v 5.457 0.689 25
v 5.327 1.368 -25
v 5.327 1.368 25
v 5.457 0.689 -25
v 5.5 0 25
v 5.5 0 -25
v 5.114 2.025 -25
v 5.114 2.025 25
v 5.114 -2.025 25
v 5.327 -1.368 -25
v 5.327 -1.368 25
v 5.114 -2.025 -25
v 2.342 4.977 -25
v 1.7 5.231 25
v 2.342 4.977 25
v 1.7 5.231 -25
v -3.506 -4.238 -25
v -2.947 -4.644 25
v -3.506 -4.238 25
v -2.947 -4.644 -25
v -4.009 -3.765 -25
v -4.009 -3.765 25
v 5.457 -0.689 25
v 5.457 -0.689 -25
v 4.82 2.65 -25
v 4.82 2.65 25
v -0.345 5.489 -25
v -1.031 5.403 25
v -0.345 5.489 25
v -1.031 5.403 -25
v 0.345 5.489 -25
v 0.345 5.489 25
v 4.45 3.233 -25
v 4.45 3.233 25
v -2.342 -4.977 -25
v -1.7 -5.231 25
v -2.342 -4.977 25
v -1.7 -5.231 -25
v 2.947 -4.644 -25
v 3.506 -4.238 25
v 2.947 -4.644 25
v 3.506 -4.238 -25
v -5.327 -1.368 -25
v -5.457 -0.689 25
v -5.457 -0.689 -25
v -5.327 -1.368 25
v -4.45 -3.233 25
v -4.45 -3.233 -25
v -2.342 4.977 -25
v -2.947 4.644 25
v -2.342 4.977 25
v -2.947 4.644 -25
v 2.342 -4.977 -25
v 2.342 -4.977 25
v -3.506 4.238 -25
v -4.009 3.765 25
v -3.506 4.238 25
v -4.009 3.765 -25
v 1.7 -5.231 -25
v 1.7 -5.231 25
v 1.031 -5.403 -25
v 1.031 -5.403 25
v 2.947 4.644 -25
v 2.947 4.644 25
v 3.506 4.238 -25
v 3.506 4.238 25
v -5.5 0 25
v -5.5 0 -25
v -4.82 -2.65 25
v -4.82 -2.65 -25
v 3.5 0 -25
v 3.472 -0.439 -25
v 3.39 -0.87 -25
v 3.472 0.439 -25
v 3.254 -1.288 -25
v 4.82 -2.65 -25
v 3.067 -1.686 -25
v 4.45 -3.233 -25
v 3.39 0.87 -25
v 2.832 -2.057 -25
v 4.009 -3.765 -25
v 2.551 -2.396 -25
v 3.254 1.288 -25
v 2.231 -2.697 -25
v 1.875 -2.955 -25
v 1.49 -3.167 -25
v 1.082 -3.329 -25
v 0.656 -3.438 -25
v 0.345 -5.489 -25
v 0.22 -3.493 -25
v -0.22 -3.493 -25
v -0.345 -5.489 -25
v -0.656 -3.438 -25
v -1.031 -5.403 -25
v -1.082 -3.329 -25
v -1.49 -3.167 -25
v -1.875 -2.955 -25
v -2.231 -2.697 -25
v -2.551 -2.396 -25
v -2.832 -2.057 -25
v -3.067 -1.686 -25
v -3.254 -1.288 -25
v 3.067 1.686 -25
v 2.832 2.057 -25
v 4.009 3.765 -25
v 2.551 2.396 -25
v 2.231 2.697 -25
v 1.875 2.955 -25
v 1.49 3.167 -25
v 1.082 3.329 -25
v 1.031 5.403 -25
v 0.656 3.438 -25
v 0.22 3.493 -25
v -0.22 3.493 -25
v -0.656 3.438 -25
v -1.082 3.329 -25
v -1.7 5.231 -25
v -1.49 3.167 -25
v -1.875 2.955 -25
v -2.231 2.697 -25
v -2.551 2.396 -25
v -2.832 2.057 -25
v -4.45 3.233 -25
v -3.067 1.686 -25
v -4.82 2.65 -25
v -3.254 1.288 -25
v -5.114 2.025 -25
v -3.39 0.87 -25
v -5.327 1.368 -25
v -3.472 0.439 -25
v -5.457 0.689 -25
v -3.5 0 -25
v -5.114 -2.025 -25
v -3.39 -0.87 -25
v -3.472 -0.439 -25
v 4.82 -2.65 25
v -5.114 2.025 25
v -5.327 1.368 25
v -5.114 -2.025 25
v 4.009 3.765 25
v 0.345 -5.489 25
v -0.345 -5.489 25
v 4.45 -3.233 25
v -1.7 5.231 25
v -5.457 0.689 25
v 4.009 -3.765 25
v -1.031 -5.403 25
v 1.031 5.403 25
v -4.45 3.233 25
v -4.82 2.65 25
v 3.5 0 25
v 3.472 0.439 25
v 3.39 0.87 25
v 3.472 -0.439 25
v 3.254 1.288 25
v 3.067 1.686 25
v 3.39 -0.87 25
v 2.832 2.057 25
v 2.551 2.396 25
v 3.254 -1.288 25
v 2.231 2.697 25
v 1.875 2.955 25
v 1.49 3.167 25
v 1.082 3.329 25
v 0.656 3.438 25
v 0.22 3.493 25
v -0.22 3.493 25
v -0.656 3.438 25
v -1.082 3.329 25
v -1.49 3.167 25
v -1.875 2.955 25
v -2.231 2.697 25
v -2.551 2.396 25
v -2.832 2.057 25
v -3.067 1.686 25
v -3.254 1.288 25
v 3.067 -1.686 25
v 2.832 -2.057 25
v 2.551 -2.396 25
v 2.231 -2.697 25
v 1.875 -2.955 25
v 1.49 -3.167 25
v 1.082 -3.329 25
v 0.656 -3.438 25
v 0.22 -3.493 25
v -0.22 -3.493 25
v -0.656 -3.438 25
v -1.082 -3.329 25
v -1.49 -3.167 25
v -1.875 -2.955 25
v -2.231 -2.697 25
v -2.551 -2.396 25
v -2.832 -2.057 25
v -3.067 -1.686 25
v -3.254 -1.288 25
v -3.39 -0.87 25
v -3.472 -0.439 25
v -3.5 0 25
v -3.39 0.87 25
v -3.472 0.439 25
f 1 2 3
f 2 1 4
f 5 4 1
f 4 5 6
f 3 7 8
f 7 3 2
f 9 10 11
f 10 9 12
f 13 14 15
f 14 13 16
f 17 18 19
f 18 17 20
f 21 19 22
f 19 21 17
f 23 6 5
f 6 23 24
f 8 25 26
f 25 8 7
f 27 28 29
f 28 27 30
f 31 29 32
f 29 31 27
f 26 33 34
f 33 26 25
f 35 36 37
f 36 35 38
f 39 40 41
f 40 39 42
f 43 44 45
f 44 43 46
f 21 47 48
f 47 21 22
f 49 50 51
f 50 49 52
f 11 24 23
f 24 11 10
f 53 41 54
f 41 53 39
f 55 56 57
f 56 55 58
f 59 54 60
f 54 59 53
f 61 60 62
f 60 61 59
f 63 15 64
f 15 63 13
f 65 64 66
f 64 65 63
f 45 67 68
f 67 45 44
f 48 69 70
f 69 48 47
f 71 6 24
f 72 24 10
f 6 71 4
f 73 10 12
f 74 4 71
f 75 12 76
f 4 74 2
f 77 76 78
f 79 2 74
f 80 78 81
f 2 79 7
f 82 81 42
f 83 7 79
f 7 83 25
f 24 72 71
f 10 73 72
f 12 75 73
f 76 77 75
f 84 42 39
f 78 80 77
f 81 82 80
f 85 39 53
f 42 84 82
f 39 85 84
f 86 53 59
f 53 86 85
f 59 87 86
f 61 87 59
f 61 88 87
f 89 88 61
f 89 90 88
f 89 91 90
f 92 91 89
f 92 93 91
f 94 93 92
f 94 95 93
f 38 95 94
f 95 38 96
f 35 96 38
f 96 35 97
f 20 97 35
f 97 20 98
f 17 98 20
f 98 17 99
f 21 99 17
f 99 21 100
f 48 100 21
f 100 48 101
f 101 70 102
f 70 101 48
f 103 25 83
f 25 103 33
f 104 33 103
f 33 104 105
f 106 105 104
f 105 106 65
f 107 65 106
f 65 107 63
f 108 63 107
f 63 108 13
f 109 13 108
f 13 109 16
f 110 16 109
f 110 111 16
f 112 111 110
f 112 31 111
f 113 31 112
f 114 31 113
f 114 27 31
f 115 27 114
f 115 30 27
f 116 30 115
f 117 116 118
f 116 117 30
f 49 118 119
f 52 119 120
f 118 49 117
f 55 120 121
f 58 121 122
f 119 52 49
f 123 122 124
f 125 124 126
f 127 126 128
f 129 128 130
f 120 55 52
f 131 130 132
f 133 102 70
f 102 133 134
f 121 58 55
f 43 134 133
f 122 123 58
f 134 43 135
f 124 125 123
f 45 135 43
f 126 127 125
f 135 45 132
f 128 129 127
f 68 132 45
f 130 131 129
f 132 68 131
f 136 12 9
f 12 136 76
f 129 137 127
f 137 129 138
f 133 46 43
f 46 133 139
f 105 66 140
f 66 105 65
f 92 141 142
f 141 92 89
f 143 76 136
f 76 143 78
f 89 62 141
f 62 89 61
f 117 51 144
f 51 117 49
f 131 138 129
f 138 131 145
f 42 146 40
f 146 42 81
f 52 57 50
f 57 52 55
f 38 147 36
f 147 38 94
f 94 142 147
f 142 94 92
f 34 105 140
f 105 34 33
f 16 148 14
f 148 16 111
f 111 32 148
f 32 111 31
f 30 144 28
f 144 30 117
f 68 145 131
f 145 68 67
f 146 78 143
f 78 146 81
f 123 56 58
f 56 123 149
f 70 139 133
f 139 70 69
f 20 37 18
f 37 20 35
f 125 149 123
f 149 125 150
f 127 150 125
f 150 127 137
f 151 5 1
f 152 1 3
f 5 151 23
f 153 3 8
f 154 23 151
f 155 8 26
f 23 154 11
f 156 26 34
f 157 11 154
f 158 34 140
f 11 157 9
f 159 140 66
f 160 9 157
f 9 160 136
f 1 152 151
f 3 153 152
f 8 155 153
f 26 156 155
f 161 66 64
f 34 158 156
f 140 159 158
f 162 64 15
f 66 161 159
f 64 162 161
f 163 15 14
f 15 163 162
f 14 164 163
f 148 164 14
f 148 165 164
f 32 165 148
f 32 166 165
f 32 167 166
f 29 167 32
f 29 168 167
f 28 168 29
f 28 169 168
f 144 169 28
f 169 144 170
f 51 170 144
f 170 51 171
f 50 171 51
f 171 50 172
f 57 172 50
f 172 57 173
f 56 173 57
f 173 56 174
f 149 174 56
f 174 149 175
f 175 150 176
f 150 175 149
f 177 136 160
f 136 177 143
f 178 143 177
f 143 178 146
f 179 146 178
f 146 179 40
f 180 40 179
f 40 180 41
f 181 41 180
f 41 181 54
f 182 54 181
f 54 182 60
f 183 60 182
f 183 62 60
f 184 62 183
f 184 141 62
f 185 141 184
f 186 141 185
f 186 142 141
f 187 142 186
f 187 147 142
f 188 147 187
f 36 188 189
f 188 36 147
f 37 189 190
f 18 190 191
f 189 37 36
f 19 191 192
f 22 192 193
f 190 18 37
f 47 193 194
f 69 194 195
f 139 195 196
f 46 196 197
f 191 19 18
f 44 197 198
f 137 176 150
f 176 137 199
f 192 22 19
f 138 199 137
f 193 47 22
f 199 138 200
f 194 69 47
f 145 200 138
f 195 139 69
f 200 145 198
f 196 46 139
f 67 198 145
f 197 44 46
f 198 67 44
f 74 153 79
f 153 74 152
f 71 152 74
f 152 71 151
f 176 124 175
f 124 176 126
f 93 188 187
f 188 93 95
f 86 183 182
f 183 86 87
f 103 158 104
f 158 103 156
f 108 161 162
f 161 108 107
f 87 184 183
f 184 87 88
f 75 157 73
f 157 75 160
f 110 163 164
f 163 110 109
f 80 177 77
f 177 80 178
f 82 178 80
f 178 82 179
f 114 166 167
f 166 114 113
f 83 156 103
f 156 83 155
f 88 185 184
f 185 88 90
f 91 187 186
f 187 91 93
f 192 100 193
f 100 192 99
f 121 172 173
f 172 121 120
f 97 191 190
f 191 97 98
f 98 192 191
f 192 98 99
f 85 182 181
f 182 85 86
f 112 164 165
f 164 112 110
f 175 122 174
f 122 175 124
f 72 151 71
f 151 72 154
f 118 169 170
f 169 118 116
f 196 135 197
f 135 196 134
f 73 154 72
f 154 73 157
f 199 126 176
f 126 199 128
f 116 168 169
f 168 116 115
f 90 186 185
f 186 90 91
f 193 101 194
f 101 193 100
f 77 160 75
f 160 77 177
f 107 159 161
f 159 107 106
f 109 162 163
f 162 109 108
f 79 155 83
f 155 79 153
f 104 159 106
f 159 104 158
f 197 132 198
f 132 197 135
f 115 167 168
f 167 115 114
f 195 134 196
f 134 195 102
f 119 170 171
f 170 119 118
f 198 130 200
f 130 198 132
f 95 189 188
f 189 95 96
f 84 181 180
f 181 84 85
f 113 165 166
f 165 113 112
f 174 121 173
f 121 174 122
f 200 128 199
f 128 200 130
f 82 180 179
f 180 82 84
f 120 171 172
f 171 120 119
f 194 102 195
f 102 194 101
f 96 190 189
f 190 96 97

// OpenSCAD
$fn = 50;


difference() {
	union() {
		translate(v = [0, 0, -25.0000000000]) {
			cylinder(h = 50, r = 5.5000000000);
		}
	}
	union() {
		translate(v = [0, 0, -100.0000000000]) {
			cylinder(h = 200, r = 3.5000000000);
		}
	}
}
